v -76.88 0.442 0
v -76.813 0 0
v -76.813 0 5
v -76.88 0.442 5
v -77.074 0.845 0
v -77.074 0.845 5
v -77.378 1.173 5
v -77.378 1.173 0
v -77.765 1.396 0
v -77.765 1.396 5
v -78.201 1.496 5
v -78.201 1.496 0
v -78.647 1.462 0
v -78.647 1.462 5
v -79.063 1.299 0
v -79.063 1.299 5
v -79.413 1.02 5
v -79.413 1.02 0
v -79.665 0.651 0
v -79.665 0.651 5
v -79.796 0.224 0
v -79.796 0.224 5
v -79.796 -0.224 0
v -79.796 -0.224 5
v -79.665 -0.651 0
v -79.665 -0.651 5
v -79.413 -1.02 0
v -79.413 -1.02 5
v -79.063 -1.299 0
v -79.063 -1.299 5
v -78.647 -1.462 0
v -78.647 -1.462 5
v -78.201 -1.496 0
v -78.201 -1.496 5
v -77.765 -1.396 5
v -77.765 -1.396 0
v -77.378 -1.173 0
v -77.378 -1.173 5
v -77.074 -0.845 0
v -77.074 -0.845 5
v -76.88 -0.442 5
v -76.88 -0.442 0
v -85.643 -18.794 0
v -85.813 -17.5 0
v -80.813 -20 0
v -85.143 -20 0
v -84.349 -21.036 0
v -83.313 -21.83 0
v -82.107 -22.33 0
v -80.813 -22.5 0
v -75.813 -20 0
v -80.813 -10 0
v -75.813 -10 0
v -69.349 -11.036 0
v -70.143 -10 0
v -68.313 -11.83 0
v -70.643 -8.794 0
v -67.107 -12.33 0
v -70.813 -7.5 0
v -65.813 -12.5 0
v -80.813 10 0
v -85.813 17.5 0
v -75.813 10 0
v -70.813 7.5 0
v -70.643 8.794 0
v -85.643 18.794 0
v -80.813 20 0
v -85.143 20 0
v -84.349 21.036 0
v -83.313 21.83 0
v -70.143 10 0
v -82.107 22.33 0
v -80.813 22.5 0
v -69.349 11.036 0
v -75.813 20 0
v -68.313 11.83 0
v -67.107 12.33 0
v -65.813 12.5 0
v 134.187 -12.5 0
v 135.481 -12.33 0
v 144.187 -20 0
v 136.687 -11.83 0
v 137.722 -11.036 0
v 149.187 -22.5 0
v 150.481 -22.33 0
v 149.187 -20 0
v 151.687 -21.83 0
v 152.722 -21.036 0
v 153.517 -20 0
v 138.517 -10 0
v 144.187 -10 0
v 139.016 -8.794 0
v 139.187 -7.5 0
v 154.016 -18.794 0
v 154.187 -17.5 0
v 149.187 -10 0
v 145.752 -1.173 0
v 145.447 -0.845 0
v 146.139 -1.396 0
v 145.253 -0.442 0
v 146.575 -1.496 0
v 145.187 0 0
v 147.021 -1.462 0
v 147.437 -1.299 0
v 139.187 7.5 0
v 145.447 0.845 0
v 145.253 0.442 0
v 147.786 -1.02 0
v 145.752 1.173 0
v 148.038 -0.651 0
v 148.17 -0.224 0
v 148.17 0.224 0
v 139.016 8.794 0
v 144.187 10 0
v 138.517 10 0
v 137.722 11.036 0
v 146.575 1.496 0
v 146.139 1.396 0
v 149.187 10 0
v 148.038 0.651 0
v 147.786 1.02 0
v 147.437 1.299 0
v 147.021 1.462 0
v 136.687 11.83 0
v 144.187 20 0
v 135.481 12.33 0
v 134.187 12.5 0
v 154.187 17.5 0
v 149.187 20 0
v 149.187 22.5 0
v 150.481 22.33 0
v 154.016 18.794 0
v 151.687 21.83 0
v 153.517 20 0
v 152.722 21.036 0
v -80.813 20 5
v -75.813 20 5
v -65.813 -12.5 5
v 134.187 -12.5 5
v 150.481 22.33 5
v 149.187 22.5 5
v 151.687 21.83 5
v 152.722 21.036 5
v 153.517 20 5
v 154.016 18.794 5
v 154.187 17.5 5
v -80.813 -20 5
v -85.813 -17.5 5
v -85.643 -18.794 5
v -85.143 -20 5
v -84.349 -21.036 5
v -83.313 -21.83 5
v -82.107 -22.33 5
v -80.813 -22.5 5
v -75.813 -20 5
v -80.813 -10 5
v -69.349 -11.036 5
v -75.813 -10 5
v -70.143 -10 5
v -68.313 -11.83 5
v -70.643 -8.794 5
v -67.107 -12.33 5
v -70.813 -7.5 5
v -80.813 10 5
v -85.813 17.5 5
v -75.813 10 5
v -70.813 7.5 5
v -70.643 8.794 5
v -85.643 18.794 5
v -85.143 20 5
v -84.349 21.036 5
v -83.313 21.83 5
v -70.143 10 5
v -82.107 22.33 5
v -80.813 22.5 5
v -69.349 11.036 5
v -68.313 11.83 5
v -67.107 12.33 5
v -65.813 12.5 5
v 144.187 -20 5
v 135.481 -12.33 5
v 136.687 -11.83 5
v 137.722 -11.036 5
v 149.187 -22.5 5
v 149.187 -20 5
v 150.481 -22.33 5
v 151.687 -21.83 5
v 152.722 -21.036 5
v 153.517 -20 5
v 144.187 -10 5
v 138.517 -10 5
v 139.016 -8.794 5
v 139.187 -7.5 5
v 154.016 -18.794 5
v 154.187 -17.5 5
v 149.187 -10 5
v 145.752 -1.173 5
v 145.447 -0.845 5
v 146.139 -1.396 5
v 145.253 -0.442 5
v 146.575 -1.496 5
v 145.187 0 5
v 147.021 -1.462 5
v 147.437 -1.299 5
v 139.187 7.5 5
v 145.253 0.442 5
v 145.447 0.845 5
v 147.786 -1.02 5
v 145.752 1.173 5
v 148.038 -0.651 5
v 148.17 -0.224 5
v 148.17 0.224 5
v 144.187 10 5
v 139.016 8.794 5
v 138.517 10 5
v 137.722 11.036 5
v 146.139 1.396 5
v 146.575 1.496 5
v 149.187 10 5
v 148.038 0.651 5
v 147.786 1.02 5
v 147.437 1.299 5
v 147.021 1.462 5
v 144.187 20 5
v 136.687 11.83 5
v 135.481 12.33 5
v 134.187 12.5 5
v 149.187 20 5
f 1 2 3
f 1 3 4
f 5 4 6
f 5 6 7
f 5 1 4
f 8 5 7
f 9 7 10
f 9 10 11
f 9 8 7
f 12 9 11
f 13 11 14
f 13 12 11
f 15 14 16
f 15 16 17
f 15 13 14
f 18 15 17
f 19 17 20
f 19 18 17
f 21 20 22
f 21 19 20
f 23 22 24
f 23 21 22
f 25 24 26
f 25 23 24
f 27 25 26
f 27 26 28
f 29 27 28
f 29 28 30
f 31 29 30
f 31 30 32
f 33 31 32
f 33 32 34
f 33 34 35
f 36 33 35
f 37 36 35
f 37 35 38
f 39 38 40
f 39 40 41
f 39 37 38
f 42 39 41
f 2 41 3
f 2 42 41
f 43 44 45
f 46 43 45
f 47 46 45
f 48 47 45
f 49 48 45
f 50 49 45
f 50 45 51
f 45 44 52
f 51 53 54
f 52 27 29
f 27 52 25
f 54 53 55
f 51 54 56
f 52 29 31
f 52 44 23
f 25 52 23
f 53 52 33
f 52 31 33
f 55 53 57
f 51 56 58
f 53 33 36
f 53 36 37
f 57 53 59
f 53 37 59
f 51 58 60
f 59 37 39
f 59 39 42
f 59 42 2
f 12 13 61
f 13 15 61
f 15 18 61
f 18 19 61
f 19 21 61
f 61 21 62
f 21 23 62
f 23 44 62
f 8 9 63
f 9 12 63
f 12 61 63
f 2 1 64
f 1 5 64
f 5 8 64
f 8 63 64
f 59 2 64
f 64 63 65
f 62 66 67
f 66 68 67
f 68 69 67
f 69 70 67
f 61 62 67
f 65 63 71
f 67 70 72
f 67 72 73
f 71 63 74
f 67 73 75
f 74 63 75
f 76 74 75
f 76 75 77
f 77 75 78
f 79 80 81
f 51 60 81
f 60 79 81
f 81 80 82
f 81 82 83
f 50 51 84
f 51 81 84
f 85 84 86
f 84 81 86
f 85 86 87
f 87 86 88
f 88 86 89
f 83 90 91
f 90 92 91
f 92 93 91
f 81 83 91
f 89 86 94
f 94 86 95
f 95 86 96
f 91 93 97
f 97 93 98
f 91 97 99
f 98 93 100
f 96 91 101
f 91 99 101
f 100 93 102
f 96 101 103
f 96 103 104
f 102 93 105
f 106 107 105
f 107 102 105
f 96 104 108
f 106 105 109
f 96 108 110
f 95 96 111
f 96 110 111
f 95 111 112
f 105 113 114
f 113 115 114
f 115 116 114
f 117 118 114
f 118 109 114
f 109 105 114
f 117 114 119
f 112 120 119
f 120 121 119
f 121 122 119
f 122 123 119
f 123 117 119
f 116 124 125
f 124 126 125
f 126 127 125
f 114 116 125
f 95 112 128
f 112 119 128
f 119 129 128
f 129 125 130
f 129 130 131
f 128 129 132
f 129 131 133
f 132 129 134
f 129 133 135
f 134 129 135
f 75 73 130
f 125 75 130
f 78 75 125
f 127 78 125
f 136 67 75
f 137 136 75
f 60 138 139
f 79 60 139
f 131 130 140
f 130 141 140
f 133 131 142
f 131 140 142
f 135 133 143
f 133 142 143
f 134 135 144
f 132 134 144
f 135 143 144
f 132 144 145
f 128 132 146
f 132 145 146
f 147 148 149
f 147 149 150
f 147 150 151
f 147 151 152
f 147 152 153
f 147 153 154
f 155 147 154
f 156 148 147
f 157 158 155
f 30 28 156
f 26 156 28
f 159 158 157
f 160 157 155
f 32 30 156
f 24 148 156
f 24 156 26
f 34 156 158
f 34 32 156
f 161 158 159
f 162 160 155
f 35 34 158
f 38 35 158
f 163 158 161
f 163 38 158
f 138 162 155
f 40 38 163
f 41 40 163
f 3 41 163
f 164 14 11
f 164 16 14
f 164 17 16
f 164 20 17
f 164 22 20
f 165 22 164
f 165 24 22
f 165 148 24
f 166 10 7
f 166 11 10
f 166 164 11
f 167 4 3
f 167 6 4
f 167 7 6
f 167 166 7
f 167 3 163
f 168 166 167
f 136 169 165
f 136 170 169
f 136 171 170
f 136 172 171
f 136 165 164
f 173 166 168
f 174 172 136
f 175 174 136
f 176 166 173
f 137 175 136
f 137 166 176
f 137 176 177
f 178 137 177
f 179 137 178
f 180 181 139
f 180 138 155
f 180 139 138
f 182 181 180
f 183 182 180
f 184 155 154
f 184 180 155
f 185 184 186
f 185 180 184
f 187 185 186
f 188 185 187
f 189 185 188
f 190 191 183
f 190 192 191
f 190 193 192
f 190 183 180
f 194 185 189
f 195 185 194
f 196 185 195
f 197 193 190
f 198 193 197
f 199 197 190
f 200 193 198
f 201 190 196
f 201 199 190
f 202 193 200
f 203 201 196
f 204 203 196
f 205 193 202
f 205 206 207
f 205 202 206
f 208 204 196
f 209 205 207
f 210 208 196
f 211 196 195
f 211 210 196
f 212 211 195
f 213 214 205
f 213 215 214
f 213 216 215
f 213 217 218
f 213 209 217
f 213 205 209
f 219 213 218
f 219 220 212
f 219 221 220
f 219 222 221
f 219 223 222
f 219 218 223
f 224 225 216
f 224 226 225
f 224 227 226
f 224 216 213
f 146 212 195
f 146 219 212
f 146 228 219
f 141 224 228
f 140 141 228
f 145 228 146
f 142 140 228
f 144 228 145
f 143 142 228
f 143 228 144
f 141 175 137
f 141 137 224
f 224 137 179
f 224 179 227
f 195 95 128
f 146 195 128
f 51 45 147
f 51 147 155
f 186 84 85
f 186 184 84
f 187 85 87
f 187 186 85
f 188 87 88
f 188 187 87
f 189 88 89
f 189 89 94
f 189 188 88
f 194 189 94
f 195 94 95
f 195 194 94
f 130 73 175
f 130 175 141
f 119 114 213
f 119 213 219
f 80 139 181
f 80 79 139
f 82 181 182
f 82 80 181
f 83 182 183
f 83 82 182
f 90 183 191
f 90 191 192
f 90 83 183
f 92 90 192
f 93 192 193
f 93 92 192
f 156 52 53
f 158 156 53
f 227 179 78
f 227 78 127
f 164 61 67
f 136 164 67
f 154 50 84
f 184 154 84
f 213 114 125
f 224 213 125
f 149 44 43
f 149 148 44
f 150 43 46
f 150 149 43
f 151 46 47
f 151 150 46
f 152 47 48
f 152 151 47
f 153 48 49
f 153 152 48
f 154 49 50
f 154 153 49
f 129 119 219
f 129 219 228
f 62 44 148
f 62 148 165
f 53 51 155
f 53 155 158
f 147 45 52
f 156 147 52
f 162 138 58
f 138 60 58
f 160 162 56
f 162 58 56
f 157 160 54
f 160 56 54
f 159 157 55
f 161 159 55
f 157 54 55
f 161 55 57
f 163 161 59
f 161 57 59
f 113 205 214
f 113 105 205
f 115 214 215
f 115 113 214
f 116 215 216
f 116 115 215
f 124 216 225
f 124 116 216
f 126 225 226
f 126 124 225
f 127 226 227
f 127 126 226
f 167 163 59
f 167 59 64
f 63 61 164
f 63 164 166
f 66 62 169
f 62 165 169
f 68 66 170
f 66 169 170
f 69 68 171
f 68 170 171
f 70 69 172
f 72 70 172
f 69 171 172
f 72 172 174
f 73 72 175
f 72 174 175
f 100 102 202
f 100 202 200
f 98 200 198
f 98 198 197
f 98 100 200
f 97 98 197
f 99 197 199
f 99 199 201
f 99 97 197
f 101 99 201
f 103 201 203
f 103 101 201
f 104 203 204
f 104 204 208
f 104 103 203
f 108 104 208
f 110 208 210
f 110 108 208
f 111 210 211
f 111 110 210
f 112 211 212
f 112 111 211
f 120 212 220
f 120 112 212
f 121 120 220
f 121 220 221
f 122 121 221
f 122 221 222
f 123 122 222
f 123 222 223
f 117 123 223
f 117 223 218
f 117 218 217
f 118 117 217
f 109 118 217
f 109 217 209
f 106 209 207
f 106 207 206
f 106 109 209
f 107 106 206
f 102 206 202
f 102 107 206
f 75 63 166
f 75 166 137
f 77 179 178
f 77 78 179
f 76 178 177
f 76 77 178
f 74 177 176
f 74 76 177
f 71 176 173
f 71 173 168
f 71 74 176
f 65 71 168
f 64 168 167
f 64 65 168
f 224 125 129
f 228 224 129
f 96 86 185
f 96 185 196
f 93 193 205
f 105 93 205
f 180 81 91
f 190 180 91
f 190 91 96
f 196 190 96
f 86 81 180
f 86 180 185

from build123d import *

# Parameters (mm, degrees)
SKETCH1_W               = 240
SKETCH1_H               = 45
SKETCH1_R               = 1.5
SKETCH1_W_2             = 5
SKETCH1_H_2             = 10
BOSS_EXTRUDE1_DEPTH     = 5
ESQUISSE1_W             = 210
ESQUISSE1_H             = 25
ENL_V_MAT_EXTRU_1_DEPTH = 10
CONG_1_R                = 5


with BuildPart() as part:
    # Sketch1 → Boss-Extrude1 (new body)
    with BuildSketch(Plane.XY):
        with Locations((34.186746988, 0)):
            Rectangle(SKETCH1_W, SKETCH1_H)
        with Locations((-78.313253012, 0)):
            Circle(SKETCH1_R, mode=Mode.SUBTRACT)
        with Locations(Location((146.686746988, 0, 0), (0, 0, 180))):
            Circle(SKETCH1_R, mode=Mode.SUBTRACT)
        with Locations((-78.313253012, -15)):
            Rectangle(SKETCH1_W_2, SKETCH1_H_2, mode=Mode.SUBTRACT)
        with Locations((-78.313253012, 15)):
            Rectangle(SKETCH1_W_2, SKETCH1_H_2, mode=Mode.SUBTRACT)
        with Locations((146.686746988, -15)):
            Rectangle(SKETCH1_W_2, SKETCH1_H_2, mode=Mode.SUBTRACT)
        with Locations((146.686746988, 15)):
            Rectangle(SKETCH1_W_2, SKETCH1_H_2, mode=Mode.SUBTRACT)
    extrude(amount=BOSS_EXTRUDE1_DEPTH)

    # Esquisse1 → Enlèv. mat.-Extru.1 (cut)
    with BuildSketch(Plane.XY.offset(5)):
        with Locations((34.186746988, 0)):
            Rectangle(ESQUISSE1_W, ESQUISSE1_H)
    extrude(amount=-ENL_V_MAT_EXTRU_1_DEPTH, mode=Mode.SUBTRACT)

    # Congé1
    cong_1_edges = [part.edges().sort_by_distance(p)[0] for p in [
        (-85.813253012, 22.5, 2.5),
        (154.186746988, 22.5, 2.5),
        (154.186746988, -22.5, 2.5),
        (-85.813253012, -22.5, 2.5),
        (-70.813253012, -12.5, 2.5),
        (-70.813253012, 12.5, 2.5),
        (139.186746988, 12.5, 2.5),
        (139.186746988, -12.5, 2.5),
    ]]
    fillet(cong_1_edges, radius=CONG_1_R)


solid = part.part
